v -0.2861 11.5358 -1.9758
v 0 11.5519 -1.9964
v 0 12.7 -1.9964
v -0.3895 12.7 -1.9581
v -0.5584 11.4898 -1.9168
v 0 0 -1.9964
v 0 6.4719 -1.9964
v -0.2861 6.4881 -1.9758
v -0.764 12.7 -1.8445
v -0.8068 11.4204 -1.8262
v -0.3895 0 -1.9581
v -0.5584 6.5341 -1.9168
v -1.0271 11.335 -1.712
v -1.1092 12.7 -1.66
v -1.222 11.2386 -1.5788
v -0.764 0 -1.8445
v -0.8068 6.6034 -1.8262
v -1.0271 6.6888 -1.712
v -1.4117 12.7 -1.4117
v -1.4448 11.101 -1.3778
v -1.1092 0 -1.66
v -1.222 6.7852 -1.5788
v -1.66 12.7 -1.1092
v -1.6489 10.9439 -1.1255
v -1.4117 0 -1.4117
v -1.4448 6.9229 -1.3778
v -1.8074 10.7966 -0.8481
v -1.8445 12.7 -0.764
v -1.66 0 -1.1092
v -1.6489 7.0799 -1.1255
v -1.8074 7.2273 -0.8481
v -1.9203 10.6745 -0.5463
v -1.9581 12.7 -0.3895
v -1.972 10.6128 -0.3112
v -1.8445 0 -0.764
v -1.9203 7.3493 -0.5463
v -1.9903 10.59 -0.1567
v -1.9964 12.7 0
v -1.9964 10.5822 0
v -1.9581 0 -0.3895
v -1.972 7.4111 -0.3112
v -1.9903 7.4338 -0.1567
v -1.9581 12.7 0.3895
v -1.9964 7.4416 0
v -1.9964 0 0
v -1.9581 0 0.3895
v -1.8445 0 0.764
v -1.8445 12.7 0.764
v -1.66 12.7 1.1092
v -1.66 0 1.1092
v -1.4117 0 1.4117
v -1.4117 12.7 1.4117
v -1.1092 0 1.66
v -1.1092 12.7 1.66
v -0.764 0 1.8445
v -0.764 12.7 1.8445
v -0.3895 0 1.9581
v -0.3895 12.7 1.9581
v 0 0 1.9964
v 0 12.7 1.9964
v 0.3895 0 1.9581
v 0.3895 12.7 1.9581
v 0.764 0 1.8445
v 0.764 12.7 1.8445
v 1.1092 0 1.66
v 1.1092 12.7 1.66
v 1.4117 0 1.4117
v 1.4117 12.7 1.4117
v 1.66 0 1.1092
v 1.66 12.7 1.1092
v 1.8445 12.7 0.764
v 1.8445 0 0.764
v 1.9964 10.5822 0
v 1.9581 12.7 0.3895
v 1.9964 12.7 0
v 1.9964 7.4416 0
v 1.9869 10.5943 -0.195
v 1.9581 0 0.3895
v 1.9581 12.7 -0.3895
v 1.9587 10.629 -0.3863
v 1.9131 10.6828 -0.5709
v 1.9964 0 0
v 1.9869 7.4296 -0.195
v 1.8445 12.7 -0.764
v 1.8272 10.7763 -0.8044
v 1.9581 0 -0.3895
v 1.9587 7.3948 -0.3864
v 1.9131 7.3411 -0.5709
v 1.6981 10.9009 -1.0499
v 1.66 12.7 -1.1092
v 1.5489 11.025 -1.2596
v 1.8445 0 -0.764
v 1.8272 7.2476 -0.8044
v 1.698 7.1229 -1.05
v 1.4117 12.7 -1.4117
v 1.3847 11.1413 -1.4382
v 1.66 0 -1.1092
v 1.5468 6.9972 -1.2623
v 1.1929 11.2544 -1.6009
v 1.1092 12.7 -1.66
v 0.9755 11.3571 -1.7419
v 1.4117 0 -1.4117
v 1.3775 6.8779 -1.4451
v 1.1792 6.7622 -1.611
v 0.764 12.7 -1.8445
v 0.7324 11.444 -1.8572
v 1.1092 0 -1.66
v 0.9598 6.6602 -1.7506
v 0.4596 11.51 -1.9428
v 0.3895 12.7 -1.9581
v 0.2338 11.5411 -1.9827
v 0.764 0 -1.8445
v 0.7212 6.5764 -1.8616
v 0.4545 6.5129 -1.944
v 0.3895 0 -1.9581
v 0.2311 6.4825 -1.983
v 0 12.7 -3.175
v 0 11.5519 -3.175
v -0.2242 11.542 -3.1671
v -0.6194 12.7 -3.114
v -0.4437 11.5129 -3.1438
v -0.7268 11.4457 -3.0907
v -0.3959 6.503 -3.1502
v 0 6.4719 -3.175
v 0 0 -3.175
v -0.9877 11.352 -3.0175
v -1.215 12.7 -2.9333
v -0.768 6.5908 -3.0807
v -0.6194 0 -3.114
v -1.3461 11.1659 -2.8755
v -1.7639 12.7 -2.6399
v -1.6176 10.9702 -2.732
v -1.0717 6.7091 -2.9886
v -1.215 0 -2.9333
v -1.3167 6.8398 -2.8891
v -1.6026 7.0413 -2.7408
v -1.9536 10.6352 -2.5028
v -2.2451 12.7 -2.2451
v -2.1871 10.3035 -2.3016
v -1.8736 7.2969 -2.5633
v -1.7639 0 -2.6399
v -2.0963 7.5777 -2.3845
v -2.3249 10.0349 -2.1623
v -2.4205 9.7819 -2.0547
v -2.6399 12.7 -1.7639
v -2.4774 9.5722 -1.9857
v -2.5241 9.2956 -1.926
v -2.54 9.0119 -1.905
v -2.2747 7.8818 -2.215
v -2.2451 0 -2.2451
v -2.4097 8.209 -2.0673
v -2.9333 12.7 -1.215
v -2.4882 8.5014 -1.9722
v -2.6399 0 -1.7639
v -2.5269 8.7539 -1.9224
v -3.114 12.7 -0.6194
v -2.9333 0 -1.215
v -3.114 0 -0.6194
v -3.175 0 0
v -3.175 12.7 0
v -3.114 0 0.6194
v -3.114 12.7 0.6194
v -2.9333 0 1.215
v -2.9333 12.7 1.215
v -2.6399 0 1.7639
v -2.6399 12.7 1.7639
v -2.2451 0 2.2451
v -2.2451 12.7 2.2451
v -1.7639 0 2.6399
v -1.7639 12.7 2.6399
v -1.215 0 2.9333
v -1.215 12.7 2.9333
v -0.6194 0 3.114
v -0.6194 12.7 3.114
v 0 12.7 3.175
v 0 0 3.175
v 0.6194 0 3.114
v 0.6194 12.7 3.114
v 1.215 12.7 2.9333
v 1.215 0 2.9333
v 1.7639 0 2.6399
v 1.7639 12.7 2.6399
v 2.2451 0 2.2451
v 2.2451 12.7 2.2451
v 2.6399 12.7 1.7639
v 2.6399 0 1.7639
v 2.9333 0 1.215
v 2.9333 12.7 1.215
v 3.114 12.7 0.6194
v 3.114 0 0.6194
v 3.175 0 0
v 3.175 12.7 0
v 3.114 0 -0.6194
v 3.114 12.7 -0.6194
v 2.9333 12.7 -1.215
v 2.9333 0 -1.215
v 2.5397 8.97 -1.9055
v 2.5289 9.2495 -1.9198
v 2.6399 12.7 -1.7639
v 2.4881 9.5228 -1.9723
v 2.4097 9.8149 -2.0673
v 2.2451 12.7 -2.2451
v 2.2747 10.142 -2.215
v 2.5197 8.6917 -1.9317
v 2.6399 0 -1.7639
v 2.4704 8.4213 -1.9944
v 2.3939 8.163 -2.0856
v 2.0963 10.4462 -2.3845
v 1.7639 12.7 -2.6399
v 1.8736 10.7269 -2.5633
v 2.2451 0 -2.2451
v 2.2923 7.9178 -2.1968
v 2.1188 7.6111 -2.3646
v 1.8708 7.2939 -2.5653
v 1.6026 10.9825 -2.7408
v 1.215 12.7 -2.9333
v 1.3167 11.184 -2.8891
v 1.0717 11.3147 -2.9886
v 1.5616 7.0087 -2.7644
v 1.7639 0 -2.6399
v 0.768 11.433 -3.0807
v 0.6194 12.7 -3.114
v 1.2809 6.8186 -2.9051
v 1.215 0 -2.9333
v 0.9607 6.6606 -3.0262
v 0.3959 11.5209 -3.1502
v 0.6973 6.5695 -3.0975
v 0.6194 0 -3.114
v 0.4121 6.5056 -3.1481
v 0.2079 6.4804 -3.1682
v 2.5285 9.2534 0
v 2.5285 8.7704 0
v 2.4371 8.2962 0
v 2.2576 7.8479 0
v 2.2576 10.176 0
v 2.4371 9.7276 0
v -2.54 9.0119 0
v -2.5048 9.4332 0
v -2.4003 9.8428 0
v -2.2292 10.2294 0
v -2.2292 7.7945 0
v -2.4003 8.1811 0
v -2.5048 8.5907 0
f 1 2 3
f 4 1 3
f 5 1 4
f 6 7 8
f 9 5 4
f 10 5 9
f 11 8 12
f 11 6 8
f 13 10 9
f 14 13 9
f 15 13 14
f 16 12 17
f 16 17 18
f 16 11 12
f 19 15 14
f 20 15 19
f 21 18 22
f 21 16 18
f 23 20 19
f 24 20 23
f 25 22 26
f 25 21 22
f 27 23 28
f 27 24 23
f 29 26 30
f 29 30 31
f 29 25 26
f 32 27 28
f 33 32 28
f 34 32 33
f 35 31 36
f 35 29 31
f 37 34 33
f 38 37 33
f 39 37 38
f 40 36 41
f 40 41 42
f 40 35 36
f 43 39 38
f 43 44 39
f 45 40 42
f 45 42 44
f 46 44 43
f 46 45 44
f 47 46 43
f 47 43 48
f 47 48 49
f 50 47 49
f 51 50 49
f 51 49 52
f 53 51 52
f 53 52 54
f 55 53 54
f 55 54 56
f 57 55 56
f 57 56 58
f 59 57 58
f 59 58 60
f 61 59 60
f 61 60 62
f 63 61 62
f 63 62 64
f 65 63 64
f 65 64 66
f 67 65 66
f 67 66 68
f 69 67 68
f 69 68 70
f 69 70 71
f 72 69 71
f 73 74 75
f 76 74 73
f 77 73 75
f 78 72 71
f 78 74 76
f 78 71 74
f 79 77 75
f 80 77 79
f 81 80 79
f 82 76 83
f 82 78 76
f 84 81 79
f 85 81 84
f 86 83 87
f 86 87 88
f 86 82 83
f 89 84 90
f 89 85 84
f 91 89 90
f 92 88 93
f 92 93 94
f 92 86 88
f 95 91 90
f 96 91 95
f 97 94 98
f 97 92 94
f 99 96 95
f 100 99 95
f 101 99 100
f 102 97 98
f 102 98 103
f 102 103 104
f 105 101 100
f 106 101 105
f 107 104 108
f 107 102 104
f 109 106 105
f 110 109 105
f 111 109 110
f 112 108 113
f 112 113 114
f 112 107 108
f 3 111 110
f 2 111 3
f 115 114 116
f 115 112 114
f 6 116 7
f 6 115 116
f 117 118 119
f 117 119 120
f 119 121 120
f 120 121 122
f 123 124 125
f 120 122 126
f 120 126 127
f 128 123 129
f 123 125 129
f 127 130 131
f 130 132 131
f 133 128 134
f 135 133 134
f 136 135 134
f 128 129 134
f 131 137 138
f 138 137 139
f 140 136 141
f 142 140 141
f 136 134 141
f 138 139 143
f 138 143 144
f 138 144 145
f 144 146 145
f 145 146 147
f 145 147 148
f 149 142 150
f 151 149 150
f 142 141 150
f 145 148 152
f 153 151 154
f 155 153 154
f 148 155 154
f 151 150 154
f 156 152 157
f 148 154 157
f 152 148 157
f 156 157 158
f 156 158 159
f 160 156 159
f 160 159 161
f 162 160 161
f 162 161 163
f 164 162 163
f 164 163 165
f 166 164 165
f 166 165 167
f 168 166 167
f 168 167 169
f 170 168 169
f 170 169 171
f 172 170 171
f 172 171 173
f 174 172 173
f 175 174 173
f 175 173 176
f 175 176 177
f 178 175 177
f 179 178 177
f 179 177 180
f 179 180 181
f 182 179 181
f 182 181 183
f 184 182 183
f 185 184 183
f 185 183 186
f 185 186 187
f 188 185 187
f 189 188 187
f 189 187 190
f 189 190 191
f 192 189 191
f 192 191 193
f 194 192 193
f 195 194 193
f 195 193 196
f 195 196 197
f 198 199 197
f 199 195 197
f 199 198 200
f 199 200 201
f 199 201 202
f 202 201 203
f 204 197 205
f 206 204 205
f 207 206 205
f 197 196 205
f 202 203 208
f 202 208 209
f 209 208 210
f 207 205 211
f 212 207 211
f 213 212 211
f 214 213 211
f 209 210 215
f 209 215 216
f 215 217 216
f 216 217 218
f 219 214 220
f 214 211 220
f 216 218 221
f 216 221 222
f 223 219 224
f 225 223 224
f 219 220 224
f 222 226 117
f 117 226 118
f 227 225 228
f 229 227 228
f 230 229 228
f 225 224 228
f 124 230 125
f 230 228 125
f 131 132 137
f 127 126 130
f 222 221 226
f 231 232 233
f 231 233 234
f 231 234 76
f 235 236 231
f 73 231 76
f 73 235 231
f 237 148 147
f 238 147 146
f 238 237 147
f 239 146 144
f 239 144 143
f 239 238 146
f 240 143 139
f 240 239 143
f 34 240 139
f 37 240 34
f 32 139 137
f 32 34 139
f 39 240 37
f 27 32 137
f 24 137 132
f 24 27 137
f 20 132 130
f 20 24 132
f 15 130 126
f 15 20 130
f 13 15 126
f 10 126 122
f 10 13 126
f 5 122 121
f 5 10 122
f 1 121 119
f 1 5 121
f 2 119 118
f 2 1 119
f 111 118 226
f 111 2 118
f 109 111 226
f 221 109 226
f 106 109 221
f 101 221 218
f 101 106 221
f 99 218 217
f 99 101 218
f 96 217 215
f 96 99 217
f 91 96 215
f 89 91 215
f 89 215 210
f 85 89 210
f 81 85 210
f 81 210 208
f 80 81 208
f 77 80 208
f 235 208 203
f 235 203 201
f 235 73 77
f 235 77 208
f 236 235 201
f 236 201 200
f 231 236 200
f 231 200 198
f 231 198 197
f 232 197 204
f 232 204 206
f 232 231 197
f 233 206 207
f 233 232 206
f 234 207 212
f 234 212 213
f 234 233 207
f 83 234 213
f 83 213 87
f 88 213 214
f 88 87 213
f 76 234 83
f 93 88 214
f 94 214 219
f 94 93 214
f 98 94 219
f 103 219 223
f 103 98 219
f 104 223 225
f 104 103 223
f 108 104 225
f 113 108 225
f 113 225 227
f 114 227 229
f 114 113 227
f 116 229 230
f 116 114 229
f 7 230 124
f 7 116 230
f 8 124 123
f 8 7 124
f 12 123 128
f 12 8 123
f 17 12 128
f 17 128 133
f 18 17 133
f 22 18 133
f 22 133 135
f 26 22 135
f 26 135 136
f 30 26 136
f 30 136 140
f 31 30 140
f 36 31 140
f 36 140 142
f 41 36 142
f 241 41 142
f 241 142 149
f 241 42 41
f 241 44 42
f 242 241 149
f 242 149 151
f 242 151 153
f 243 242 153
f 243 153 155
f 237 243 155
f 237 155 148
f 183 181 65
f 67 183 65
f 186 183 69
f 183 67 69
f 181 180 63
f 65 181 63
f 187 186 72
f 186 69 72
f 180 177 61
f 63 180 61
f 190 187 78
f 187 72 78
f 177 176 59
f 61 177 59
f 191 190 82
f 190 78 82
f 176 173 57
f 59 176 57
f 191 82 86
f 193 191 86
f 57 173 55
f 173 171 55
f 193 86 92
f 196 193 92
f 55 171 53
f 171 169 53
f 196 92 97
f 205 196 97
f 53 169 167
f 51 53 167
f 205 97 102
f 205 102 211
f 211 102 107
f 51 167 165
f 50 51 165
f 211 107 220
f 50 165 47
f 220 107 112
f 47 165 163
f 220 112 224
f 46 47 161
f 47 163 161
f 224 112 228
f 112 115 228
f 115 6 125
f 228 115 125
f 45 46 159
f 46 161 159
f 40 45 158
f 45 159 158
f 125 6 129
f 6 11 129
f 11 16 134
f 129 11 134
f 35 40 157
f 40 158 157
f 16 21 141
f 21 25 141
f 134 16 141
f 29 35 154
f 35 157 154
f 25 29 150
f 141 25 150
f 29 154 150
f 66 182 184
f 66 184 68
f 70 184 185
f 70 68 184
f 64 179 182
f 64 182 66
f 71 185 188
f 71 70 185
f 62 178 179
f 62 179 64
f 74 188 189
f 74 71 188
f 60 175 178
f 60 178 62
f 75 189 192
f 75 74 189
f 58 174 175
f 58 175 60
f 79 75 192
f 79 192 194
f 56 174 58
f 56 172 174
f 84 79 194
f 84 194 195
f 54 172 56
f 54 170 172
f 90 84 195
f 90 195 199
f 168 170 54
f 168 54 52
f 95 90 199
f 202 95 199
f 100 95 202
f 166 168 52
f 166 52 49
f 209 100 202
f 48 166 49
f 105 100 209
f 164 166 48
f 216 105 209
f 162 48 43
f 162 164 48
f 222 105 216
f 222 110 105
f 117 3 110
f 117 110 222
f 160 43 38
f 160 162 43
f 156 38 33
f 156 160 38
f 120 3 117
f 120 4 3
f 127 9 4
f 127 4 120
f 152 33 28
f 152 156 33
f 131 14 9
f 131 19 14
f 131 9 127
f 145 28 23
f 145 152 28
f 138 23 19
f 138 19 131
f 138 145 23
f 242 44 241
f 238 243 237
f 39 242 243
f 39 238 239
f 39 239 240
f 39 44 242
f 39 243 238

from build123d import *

# Parameters (mm, degrees)
SKETCH1_R           = 3.175
SKETCH1_R_2         = 1.99644
BOSS_EXTRUDE1_DEPTH = 12.7
SKETCH4_R           = 2.54
CUT_EXTRUDE1_DEPTH  = 3.175


with BuildPart() as part:
    # Sketch1 → Boss-Extrude1 (new body)
    with BuildSketch(Plane(origin=(0, 0, 0), x_dir=(1, 0, 0), z_dir=(0, 1, 0))):
        Circle(SKETCH1_R)
        Circle(SKETCH1_R_2, mode=Mode.SUBTRACT)
    extrude(amount=BOSS_EXTRUDE1_DEPTH)

    # Sketch4 → Cut-Extrude1 (cut)
    with BuildSketch(Plane(origin=(0, 12.7, -3.175), x_dir=(-1, 0, 0), z_dir=(0, 0, -1))):
        with Locations((0, -3.68808)):
            Circle(SKETCH4_R)
    extrude(amount=-CUT_EXTRUDE1_DEPTH, mode=Mode.SUBTRACT)


solid = part.part
